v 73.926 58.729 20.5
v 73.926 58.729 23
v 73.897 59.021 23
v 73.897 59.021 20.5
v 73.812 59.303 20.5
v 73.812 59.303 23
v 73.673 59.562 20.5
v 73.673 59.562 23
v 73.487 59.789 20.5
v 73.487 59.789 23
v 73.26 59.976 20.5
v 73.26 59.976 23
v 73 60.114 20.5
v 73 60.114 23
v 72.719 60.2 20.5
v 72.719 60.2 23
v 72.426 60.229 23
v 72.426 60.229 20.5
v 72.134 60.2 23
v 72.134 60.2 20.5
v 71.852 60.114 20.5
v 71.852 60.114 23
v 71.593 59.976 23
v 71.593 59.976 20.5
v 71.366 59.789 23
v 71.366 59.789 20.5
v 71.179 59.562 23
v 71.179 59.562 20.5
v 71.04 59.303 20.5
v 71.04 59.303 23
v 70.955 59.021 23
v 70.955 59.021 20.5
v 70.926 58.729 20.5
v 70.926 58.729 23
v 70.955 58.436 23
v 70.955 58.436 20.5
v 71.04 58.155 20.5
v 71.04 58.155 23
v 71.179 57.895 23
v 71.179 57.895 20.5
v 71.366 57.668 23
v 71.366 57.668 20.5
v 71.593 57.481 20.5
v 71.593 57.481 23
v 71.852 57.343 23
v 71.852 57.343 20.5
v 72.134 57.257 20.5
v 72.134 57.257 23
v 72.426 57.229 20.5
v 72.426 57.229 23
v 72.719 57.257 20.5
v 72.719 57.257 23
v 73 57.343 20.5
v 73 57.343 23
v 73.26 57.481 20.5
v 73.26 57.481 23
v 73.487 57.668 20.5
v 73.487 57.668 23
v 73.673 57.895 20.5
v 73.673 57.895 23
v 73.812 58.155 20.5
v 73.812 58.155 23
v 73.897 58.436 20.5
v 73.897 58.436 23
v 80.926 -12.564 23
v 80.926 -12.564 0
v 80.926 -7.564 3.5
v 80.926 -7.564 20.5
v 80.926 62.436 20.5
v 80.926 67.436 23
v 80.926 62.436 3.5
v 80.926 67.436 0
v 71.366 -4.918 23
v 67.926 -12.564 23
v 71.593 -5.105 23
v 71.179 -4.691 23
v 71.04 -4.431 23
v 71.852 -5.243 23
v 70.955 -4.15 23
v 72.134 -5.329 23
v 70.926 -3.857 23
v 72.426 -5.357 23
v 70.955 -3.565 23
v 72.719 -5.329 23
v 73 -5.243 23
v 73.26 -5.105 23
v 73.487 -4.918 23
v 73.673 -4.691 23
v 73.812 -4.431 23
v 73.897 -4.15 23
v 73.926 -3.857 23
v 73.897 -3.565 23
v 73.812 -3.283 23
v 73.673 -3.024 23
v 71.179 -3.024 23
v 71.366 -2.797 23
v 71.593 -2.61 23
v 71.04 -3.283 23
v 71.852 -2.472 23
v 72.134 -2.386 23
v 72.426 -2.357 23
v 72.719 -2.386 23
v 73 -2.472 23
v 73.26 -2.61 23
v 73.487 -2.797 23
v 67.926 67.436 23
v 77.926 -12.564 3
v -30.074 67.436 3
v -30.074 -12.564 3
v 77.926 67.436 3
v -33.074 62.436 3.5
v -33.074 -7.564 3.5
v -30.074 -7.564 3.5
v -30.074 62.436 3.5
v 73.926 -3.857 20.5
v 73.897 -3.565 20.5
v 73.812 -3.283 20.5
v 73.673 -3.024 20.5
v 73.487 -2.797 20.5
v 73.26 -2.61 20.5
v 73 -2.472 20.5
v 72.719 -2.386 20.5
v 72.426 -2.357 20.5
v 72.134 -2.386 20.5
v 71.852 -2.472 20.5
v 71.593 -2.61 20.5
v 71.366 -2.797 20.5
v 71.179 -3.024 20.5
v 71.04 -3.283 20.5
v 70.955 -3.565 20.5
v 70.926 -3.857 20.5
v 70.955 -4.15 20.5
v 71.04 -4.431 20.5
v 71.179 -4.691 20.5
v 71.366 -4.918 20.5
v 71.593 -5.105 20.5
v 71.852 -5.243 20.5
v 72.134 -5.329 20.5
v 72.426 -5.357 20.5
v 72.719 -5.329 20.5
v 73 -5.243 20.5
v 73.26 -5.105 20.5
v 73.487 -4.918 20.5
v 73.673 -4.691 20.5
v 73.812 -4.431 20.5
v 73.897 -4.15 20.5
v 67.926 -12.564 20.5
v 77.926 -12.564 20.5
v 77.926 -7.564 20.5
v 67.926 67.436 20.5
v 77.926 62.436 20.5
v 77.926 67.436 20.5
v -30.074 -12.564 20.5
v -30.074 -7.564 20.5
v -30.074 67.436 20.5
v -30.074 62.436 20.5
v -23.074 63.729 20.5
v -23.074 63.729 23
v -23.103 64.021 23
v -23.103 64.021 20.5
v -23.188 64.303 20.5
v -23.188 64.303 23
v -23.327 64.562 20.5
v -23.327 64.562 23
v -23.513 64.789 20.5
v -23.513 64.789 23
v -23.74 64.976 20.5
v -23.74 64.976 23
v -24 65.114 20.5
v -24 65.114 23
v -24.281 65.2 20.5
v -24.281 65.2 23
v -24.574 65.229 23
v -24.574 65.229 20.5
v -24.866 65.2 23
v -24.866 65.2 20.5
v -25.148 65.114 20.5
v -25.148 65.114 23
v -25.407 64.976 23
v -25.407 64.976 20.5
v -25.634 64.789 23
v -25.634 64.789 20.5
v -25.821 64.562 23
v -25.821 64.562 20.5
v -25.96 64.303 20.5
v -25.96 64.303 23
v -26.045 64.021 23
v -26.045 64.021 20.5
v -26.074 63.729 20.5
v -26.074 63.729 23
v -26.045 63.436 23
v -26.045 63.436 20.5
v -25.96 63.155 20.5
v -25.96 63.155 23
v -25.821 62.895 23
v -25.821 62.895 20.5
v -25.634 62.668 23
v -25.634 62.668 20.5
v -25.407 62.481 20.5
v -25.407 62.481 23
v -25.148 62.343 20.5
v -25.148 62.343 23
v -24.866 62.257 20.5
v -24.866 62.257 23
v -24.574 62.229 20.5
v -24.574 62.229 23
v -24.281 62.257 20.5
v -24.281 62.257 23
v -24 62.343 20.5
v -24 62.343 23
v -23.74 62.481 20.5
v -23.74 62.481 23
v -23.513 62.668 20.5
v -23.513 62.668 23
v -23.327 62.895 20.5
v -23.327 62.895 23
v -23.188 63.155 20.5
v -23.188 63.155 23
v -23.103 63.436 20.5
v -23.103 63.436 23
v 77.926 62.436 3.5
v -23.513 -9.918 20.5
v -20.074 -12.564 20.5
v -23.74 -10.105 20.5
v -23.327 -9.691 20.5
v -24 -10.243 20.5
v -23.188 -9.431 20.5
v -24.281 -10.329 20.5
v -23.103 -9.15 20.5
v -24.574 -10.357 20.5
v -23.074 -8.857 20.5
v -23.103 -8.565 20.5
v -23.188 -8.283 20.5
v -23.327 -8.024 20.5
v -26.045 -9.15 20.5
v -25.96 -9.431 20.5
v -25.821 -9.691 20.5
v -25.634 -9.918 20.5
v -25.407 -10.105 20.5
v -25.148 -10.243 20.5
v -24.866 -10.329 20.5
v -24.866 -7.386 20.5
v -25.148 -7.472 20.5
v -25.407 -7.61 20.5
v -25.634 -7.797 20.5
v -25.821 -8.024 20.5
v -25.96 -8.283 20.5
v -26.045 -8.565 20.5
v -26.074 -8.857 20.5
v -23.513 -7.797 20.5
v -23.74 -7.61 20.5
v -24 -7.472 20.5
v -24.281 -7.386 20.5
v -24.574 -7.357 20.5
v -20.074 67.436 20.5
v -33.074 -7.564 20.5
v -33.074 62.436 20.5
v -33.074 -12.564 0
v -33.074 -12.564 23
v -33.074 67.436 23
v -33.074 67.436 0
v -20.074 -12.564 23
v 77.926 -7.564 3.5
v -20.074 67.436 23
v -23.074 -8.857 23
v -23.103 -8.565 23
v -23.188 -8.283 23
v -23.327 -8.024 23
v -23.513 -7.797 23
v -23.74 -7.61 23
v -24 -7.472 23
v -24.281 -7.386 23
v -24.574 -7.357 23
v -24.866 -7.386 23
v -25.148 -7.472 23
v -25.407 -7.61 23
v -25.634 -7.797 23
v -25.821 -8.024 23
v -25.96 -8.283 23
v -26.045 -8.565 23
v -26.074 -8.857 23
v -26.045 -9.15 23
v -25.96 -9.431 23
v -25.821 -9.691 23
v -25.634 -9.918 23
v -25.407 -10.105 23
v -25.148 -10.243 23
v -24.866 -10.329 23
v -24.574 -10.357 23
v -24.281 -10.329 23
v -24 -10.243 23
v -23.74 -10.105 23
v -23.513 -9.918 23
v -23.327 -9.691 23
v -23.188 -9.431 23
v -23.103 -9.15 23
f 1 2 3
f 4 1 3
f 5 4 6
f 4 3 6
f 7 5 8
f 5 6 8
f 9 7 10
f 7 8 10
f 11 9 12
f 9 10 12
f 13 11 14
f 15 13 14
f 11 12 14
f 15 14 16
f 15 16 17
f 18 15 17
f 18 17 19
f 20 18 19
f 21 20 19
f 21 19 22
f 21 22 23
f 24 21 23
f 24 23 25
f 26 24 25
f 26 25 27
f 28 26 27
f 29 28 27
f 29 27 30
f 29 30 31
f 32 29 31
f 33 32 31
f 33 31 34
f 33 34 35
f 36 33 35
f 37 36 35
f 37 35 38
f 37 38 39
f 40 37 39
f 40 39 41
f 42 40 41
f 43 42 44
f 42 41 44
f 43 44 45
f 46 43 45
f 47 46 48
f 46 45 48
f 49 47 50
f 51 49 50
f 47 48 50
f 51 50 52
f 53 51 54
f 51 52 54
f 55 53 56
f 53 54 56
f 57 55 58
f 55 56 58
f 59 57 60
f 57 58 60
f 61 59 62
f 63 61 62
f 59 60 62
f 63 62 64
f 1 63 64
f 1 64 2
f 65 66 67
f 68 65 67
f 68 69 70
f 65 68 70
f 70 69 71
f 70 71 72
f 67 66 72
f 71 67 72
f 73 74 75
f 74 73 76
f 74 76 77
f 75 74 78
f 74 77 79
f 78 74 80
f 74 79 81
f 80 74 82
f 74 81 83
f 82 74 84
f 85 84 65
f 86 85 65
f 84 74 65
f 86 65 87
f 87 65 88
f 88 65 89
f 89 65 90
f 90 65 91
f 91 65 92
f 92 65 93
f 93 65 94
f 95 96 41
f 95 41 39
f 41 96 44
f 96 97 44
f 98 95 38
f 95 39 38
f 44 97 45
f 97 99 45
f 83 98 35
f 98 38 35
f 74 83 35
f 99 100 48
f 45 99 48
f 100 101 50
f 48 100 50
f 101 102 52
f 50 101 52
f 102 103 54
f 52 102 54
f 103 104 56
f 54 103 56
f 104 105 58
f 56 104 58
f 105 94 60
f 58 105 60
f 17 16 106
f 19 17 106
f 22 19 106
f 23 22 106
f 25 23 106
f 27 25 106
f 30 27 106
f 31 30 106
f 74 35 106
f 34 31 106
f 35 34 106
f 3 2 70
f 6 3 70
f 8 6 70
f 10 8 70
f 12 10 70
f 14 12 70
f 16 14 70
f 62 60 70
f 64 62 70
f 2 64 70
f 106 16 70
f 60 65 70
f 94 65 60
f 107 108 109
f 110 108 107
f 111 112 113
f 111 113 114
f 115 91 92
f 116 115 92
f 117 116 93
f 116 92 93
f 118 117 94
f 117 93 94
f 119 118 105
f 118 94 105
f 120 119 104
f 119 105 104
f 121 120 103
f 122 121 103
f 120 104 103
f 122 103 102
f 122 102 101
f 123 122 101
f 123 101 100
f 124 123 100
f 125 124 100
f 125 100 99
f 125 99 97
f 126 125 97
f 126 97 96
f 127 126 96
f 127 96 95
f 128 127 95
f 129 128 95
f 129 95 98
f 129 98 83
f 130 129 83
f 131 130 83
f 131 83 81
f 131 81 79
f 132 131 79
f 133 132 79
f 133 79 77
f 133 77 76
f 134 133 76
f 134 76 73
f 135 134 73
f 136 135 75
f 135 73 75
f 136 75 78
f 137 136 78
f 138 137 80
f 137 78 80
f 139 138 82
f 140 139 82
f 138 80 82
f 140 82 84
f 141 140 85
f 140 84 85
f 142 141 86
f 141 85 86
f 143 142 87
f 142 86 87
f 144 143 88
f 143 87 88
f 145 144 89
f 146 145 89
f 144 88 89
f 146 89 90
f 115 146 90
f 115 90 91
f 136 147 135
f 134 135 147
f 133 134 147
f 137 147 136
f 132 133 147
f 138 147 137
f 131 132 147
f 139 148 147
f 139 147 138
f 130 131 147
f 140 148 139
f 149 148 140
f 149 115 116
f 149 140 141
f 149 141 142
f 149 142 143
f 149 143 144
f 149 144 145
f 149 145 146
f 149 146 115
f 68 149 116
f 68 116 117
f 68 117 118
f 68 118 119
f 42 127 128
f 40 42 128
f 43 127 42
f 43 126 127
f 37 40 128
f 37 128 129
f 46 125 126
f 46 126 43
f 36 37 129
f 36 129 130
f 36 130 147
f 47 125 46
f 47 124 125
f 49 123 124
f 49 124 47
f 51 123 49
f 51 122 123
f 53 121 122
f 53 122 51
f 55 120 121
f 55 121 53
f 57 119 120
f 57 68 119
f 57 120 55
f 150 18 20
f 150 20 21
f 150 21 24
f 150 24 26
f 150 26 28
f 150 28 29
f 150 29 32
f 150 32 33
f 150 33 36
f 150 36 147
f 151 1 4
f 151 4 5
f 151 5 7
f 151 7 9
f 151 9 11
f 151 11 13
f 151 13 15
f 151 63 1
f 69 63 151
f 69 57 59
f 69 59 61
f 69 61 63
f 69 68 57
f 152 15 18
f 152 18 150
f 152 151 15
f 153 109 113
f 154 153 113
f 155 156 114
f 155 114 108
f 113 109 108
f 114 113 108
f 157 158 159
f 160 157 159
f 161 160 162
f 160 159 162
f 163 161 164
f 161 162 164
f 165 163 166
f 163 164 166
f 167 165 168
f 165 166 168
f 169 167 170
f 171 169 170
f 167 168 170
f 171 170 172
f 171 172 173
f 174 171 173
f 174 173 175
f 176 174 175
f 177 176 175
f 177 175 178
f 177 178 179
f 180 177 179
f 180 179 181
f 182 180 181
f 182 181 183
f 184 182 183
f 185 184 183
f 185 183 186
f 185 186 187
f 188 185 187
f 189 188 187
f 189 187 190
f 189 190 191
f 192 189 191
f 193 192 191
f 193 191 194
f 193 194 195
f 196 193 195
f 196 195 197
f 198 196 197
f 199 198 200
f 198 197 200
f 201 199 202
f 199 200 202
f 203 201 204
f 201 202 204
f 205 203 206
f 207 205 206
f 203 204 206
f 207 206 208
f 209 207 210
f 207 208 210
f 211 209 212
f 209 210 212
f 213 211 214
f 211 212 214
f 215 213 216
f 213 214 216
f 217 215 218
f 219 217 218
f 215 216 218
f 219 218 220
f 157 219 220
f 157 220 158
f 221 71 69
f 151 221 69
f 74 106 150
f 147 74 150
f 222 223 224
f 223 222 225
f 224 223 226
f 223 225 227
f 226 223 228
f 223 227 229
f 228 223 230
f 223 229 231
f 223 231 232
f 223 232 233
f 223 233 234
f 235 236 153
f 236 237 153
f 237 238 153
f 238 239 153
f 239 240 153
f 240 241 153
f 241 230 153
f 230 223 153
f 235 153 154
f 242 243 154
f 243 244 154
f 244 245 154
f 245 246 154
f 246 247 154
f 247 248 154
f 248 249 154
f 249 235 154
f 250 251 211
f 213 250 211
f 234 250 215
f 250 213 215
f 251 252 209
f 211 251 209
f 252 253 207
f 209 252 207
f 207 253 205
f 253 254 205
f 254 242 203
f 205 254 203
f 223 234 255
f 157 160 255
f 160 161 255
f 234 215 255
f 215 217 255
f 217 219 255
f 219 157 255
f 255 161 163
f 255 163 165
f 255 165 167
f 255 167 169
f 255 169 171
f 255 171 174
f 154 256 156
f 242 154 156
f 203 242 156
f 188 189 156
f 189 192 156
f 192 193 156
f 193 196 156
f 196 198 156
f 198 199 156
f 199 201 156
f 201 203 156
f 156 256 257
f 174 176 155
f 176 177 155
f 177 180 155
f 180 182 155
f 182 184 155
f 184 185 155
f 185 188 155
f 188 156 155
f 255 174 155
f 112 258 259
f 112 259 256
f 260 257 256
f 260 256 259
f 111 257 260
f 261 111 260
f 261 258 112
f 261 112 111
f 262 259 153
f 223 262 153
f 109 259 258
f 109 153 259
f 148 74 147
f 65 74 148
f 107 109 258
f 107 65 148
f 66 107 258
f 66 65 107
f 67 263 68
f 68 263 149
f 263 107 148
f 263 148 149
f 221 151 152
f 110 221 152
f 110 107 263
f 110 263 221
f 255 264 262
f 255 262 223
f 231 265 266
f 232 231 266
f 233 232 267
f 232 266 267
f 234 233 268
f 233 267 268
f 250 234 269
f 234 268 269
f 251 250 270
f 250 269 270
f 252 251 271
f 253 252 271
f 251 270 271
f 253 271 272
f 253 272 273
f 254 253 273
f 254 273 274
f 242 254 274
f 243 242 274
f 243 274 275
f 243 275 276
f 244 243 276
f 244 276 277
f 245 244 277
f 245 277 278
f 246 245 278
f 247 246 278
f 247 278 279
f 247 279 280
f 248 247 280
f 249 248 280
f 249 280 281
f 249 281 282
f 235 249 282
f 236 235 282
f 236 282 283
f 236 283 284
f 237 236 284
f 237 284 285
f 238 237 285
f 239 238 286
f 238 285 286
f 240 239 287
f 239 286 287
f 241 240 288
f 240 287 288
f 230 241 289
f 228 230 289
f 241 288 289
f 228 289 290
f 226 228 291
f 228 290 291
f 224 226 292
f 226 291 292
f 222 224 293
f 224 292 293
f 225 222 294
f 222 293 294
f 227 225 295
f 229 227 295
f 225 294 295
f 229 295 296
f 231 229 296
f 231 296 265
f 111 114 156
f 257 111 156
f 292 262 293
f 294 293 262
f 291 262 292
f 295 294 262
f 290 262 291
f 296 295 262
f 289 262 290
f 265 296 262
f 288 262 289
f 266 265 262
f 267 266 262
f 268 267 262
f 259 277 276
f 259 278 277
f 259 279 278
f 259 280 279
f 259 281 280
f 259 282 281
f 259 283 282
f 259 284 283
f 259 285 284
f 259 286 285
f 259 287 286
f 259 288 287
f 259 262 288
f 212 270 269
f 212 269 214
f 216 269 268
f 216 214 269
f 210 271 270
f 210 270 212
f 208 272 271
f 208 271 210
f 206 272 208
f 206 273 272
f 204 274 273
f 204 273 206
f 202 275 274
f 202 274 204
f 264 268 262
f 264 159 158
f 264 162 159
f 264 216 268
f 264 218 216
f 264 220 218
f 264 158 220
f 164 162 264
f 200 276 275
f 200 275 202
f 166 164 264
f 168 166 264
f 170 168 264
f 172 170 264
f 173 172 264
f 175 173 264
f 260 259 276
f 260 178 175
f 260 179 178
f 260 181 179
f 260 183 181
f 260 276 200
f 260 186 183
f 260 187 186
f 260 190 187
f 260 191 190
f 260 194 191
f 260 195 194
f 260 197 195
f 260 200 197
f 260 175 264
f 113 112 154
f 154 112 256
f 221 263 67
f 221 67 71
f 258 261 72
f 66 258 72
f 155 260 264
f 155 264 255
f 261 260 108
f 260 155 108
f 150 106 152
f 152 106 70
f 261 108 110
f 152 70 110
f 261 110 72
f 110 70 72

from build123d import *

# Parameters (mm, degrees)
SKETCH10_W              = 114
SKETCH10_H              = 80
BOSS_EXTRUDE6_DEPTH     = 3
SKETCH12_W              = 3
SKETCH12_H              = 80
BOSS_EXTRUDE7_DEPTH     = 20
SKETCH13_W              = 2.5
SKETCH13_H              = 80
BOSS_EXTRUDE8_DEPTH     = 10
SKETCH16_W              = 16
SKETCH16_H              = 70
CUT_EXTRUDE3_DEPTH      = 135.434200024
SKETCH18_R              = 1.5
CUT_EXTRUDE4_DEPTH      = 10
CUT_EXTRUDE5_DEPTH      = 132.899788234
CUT_EXTRUDE5_DEPTH_BACK = 132.899788234
SKETCH19_W              = 1
SKETCH19_H              = 70


with BuildPart() as part:
    # Sketch10 → Boss-Extrude6 (new body)
    with BuildSketch(Plane.XY):
        with Locations((23.926213283, 27.43555543)):
            Rectangle(SKETCH10_W, SKETCH10_H)
    extrude(amount=BOSS_EXTRUDE6_DEPTH)

    # Sketch12 → Boss-Extrude7 (add)
    with BuildSketch(Plane.XY.offset(3)):
        with Locations((-31.573786717, 27.43555543)):
            Rectangle(SKETCH12_W, SKETCH12_H)
    boss_extrude7 = extrude(amount=BOSS_EXTRUDE7_DEPTH)

    # Sketch13 → Boss-Extrude8 (add)
    with BuildSketch(Plane(origin=(-30.073786717, 0, 0), x_dir=(0, 0, -1), z_dir=(1, 0, 0))):
        with Locations((-21.75, 27.43555543)):
            Rectangle(SKETCH13_W, SKETCH13_H)
    boss_extrude8 = extrude(amount=BOSS_EXTRUDE8_DEPTH)

    # Mirror3: Boss-Extrude7, Boss-Extrude8 across plane
    add(boss_extrude7.mirror(Plane.ZY.offset(-23.926213283)))
    add(boss_extrude8.mirror(Plane.ZY.offset(-23.926213283)))

    # Sketch16 → Cut-Extrude3 (cut, through all)
    with BuildSketch(Plane.ZY.offset(33.073786717)):
        with Locations((11.5, 27.43555543)):
            Rectangle(SKETCH16_W, SKETCH16_H)
    extrude(amount=-CUT_EXTRUDE3_DEPTH, mode=Mode.SUBTRACT)

    # Sketch18 → Cut-Extrude4 (cut)
    with BuildSketch(Plane.XY.offset(23)):
        with Locations((-24.573786717, 63.728579771)):
            Circle(SKETCH18_R)
        with Locations((-24.573786717, -8.857468911)):
            Circle(SKETCH18_R)
        with Locations((72.426213283, 58.728579771)):
            Circle(SKETCH18_R)
        with Locations((72.426213283, -3.857468911)):
            Circle(SKETCH18_R)
    extrude(amount=-CUT_EXTRUDE4_DEPTH, mode=Mode.SUBTRACT)

    # Sketch19 → Cut-Extrude5 (cut, two sides: drawn at the far end of the back side and taken through both)
    with BuildSketch(Plane.ZY.offset(-77.926213283).offset(-CUT_EXTRUDE5_DEPTH_BACK)):
        with Locations((20, 27.43555543)):
            Rectangle(SKETCH19_W, SKETCH19_H)
    extrude(amount=CUT_EXTRUDE5_DEPTH + CUT_EXTRUDE5_DEPTH_BACK, mode=Mode.SUBTRACT)


solid = part.part
